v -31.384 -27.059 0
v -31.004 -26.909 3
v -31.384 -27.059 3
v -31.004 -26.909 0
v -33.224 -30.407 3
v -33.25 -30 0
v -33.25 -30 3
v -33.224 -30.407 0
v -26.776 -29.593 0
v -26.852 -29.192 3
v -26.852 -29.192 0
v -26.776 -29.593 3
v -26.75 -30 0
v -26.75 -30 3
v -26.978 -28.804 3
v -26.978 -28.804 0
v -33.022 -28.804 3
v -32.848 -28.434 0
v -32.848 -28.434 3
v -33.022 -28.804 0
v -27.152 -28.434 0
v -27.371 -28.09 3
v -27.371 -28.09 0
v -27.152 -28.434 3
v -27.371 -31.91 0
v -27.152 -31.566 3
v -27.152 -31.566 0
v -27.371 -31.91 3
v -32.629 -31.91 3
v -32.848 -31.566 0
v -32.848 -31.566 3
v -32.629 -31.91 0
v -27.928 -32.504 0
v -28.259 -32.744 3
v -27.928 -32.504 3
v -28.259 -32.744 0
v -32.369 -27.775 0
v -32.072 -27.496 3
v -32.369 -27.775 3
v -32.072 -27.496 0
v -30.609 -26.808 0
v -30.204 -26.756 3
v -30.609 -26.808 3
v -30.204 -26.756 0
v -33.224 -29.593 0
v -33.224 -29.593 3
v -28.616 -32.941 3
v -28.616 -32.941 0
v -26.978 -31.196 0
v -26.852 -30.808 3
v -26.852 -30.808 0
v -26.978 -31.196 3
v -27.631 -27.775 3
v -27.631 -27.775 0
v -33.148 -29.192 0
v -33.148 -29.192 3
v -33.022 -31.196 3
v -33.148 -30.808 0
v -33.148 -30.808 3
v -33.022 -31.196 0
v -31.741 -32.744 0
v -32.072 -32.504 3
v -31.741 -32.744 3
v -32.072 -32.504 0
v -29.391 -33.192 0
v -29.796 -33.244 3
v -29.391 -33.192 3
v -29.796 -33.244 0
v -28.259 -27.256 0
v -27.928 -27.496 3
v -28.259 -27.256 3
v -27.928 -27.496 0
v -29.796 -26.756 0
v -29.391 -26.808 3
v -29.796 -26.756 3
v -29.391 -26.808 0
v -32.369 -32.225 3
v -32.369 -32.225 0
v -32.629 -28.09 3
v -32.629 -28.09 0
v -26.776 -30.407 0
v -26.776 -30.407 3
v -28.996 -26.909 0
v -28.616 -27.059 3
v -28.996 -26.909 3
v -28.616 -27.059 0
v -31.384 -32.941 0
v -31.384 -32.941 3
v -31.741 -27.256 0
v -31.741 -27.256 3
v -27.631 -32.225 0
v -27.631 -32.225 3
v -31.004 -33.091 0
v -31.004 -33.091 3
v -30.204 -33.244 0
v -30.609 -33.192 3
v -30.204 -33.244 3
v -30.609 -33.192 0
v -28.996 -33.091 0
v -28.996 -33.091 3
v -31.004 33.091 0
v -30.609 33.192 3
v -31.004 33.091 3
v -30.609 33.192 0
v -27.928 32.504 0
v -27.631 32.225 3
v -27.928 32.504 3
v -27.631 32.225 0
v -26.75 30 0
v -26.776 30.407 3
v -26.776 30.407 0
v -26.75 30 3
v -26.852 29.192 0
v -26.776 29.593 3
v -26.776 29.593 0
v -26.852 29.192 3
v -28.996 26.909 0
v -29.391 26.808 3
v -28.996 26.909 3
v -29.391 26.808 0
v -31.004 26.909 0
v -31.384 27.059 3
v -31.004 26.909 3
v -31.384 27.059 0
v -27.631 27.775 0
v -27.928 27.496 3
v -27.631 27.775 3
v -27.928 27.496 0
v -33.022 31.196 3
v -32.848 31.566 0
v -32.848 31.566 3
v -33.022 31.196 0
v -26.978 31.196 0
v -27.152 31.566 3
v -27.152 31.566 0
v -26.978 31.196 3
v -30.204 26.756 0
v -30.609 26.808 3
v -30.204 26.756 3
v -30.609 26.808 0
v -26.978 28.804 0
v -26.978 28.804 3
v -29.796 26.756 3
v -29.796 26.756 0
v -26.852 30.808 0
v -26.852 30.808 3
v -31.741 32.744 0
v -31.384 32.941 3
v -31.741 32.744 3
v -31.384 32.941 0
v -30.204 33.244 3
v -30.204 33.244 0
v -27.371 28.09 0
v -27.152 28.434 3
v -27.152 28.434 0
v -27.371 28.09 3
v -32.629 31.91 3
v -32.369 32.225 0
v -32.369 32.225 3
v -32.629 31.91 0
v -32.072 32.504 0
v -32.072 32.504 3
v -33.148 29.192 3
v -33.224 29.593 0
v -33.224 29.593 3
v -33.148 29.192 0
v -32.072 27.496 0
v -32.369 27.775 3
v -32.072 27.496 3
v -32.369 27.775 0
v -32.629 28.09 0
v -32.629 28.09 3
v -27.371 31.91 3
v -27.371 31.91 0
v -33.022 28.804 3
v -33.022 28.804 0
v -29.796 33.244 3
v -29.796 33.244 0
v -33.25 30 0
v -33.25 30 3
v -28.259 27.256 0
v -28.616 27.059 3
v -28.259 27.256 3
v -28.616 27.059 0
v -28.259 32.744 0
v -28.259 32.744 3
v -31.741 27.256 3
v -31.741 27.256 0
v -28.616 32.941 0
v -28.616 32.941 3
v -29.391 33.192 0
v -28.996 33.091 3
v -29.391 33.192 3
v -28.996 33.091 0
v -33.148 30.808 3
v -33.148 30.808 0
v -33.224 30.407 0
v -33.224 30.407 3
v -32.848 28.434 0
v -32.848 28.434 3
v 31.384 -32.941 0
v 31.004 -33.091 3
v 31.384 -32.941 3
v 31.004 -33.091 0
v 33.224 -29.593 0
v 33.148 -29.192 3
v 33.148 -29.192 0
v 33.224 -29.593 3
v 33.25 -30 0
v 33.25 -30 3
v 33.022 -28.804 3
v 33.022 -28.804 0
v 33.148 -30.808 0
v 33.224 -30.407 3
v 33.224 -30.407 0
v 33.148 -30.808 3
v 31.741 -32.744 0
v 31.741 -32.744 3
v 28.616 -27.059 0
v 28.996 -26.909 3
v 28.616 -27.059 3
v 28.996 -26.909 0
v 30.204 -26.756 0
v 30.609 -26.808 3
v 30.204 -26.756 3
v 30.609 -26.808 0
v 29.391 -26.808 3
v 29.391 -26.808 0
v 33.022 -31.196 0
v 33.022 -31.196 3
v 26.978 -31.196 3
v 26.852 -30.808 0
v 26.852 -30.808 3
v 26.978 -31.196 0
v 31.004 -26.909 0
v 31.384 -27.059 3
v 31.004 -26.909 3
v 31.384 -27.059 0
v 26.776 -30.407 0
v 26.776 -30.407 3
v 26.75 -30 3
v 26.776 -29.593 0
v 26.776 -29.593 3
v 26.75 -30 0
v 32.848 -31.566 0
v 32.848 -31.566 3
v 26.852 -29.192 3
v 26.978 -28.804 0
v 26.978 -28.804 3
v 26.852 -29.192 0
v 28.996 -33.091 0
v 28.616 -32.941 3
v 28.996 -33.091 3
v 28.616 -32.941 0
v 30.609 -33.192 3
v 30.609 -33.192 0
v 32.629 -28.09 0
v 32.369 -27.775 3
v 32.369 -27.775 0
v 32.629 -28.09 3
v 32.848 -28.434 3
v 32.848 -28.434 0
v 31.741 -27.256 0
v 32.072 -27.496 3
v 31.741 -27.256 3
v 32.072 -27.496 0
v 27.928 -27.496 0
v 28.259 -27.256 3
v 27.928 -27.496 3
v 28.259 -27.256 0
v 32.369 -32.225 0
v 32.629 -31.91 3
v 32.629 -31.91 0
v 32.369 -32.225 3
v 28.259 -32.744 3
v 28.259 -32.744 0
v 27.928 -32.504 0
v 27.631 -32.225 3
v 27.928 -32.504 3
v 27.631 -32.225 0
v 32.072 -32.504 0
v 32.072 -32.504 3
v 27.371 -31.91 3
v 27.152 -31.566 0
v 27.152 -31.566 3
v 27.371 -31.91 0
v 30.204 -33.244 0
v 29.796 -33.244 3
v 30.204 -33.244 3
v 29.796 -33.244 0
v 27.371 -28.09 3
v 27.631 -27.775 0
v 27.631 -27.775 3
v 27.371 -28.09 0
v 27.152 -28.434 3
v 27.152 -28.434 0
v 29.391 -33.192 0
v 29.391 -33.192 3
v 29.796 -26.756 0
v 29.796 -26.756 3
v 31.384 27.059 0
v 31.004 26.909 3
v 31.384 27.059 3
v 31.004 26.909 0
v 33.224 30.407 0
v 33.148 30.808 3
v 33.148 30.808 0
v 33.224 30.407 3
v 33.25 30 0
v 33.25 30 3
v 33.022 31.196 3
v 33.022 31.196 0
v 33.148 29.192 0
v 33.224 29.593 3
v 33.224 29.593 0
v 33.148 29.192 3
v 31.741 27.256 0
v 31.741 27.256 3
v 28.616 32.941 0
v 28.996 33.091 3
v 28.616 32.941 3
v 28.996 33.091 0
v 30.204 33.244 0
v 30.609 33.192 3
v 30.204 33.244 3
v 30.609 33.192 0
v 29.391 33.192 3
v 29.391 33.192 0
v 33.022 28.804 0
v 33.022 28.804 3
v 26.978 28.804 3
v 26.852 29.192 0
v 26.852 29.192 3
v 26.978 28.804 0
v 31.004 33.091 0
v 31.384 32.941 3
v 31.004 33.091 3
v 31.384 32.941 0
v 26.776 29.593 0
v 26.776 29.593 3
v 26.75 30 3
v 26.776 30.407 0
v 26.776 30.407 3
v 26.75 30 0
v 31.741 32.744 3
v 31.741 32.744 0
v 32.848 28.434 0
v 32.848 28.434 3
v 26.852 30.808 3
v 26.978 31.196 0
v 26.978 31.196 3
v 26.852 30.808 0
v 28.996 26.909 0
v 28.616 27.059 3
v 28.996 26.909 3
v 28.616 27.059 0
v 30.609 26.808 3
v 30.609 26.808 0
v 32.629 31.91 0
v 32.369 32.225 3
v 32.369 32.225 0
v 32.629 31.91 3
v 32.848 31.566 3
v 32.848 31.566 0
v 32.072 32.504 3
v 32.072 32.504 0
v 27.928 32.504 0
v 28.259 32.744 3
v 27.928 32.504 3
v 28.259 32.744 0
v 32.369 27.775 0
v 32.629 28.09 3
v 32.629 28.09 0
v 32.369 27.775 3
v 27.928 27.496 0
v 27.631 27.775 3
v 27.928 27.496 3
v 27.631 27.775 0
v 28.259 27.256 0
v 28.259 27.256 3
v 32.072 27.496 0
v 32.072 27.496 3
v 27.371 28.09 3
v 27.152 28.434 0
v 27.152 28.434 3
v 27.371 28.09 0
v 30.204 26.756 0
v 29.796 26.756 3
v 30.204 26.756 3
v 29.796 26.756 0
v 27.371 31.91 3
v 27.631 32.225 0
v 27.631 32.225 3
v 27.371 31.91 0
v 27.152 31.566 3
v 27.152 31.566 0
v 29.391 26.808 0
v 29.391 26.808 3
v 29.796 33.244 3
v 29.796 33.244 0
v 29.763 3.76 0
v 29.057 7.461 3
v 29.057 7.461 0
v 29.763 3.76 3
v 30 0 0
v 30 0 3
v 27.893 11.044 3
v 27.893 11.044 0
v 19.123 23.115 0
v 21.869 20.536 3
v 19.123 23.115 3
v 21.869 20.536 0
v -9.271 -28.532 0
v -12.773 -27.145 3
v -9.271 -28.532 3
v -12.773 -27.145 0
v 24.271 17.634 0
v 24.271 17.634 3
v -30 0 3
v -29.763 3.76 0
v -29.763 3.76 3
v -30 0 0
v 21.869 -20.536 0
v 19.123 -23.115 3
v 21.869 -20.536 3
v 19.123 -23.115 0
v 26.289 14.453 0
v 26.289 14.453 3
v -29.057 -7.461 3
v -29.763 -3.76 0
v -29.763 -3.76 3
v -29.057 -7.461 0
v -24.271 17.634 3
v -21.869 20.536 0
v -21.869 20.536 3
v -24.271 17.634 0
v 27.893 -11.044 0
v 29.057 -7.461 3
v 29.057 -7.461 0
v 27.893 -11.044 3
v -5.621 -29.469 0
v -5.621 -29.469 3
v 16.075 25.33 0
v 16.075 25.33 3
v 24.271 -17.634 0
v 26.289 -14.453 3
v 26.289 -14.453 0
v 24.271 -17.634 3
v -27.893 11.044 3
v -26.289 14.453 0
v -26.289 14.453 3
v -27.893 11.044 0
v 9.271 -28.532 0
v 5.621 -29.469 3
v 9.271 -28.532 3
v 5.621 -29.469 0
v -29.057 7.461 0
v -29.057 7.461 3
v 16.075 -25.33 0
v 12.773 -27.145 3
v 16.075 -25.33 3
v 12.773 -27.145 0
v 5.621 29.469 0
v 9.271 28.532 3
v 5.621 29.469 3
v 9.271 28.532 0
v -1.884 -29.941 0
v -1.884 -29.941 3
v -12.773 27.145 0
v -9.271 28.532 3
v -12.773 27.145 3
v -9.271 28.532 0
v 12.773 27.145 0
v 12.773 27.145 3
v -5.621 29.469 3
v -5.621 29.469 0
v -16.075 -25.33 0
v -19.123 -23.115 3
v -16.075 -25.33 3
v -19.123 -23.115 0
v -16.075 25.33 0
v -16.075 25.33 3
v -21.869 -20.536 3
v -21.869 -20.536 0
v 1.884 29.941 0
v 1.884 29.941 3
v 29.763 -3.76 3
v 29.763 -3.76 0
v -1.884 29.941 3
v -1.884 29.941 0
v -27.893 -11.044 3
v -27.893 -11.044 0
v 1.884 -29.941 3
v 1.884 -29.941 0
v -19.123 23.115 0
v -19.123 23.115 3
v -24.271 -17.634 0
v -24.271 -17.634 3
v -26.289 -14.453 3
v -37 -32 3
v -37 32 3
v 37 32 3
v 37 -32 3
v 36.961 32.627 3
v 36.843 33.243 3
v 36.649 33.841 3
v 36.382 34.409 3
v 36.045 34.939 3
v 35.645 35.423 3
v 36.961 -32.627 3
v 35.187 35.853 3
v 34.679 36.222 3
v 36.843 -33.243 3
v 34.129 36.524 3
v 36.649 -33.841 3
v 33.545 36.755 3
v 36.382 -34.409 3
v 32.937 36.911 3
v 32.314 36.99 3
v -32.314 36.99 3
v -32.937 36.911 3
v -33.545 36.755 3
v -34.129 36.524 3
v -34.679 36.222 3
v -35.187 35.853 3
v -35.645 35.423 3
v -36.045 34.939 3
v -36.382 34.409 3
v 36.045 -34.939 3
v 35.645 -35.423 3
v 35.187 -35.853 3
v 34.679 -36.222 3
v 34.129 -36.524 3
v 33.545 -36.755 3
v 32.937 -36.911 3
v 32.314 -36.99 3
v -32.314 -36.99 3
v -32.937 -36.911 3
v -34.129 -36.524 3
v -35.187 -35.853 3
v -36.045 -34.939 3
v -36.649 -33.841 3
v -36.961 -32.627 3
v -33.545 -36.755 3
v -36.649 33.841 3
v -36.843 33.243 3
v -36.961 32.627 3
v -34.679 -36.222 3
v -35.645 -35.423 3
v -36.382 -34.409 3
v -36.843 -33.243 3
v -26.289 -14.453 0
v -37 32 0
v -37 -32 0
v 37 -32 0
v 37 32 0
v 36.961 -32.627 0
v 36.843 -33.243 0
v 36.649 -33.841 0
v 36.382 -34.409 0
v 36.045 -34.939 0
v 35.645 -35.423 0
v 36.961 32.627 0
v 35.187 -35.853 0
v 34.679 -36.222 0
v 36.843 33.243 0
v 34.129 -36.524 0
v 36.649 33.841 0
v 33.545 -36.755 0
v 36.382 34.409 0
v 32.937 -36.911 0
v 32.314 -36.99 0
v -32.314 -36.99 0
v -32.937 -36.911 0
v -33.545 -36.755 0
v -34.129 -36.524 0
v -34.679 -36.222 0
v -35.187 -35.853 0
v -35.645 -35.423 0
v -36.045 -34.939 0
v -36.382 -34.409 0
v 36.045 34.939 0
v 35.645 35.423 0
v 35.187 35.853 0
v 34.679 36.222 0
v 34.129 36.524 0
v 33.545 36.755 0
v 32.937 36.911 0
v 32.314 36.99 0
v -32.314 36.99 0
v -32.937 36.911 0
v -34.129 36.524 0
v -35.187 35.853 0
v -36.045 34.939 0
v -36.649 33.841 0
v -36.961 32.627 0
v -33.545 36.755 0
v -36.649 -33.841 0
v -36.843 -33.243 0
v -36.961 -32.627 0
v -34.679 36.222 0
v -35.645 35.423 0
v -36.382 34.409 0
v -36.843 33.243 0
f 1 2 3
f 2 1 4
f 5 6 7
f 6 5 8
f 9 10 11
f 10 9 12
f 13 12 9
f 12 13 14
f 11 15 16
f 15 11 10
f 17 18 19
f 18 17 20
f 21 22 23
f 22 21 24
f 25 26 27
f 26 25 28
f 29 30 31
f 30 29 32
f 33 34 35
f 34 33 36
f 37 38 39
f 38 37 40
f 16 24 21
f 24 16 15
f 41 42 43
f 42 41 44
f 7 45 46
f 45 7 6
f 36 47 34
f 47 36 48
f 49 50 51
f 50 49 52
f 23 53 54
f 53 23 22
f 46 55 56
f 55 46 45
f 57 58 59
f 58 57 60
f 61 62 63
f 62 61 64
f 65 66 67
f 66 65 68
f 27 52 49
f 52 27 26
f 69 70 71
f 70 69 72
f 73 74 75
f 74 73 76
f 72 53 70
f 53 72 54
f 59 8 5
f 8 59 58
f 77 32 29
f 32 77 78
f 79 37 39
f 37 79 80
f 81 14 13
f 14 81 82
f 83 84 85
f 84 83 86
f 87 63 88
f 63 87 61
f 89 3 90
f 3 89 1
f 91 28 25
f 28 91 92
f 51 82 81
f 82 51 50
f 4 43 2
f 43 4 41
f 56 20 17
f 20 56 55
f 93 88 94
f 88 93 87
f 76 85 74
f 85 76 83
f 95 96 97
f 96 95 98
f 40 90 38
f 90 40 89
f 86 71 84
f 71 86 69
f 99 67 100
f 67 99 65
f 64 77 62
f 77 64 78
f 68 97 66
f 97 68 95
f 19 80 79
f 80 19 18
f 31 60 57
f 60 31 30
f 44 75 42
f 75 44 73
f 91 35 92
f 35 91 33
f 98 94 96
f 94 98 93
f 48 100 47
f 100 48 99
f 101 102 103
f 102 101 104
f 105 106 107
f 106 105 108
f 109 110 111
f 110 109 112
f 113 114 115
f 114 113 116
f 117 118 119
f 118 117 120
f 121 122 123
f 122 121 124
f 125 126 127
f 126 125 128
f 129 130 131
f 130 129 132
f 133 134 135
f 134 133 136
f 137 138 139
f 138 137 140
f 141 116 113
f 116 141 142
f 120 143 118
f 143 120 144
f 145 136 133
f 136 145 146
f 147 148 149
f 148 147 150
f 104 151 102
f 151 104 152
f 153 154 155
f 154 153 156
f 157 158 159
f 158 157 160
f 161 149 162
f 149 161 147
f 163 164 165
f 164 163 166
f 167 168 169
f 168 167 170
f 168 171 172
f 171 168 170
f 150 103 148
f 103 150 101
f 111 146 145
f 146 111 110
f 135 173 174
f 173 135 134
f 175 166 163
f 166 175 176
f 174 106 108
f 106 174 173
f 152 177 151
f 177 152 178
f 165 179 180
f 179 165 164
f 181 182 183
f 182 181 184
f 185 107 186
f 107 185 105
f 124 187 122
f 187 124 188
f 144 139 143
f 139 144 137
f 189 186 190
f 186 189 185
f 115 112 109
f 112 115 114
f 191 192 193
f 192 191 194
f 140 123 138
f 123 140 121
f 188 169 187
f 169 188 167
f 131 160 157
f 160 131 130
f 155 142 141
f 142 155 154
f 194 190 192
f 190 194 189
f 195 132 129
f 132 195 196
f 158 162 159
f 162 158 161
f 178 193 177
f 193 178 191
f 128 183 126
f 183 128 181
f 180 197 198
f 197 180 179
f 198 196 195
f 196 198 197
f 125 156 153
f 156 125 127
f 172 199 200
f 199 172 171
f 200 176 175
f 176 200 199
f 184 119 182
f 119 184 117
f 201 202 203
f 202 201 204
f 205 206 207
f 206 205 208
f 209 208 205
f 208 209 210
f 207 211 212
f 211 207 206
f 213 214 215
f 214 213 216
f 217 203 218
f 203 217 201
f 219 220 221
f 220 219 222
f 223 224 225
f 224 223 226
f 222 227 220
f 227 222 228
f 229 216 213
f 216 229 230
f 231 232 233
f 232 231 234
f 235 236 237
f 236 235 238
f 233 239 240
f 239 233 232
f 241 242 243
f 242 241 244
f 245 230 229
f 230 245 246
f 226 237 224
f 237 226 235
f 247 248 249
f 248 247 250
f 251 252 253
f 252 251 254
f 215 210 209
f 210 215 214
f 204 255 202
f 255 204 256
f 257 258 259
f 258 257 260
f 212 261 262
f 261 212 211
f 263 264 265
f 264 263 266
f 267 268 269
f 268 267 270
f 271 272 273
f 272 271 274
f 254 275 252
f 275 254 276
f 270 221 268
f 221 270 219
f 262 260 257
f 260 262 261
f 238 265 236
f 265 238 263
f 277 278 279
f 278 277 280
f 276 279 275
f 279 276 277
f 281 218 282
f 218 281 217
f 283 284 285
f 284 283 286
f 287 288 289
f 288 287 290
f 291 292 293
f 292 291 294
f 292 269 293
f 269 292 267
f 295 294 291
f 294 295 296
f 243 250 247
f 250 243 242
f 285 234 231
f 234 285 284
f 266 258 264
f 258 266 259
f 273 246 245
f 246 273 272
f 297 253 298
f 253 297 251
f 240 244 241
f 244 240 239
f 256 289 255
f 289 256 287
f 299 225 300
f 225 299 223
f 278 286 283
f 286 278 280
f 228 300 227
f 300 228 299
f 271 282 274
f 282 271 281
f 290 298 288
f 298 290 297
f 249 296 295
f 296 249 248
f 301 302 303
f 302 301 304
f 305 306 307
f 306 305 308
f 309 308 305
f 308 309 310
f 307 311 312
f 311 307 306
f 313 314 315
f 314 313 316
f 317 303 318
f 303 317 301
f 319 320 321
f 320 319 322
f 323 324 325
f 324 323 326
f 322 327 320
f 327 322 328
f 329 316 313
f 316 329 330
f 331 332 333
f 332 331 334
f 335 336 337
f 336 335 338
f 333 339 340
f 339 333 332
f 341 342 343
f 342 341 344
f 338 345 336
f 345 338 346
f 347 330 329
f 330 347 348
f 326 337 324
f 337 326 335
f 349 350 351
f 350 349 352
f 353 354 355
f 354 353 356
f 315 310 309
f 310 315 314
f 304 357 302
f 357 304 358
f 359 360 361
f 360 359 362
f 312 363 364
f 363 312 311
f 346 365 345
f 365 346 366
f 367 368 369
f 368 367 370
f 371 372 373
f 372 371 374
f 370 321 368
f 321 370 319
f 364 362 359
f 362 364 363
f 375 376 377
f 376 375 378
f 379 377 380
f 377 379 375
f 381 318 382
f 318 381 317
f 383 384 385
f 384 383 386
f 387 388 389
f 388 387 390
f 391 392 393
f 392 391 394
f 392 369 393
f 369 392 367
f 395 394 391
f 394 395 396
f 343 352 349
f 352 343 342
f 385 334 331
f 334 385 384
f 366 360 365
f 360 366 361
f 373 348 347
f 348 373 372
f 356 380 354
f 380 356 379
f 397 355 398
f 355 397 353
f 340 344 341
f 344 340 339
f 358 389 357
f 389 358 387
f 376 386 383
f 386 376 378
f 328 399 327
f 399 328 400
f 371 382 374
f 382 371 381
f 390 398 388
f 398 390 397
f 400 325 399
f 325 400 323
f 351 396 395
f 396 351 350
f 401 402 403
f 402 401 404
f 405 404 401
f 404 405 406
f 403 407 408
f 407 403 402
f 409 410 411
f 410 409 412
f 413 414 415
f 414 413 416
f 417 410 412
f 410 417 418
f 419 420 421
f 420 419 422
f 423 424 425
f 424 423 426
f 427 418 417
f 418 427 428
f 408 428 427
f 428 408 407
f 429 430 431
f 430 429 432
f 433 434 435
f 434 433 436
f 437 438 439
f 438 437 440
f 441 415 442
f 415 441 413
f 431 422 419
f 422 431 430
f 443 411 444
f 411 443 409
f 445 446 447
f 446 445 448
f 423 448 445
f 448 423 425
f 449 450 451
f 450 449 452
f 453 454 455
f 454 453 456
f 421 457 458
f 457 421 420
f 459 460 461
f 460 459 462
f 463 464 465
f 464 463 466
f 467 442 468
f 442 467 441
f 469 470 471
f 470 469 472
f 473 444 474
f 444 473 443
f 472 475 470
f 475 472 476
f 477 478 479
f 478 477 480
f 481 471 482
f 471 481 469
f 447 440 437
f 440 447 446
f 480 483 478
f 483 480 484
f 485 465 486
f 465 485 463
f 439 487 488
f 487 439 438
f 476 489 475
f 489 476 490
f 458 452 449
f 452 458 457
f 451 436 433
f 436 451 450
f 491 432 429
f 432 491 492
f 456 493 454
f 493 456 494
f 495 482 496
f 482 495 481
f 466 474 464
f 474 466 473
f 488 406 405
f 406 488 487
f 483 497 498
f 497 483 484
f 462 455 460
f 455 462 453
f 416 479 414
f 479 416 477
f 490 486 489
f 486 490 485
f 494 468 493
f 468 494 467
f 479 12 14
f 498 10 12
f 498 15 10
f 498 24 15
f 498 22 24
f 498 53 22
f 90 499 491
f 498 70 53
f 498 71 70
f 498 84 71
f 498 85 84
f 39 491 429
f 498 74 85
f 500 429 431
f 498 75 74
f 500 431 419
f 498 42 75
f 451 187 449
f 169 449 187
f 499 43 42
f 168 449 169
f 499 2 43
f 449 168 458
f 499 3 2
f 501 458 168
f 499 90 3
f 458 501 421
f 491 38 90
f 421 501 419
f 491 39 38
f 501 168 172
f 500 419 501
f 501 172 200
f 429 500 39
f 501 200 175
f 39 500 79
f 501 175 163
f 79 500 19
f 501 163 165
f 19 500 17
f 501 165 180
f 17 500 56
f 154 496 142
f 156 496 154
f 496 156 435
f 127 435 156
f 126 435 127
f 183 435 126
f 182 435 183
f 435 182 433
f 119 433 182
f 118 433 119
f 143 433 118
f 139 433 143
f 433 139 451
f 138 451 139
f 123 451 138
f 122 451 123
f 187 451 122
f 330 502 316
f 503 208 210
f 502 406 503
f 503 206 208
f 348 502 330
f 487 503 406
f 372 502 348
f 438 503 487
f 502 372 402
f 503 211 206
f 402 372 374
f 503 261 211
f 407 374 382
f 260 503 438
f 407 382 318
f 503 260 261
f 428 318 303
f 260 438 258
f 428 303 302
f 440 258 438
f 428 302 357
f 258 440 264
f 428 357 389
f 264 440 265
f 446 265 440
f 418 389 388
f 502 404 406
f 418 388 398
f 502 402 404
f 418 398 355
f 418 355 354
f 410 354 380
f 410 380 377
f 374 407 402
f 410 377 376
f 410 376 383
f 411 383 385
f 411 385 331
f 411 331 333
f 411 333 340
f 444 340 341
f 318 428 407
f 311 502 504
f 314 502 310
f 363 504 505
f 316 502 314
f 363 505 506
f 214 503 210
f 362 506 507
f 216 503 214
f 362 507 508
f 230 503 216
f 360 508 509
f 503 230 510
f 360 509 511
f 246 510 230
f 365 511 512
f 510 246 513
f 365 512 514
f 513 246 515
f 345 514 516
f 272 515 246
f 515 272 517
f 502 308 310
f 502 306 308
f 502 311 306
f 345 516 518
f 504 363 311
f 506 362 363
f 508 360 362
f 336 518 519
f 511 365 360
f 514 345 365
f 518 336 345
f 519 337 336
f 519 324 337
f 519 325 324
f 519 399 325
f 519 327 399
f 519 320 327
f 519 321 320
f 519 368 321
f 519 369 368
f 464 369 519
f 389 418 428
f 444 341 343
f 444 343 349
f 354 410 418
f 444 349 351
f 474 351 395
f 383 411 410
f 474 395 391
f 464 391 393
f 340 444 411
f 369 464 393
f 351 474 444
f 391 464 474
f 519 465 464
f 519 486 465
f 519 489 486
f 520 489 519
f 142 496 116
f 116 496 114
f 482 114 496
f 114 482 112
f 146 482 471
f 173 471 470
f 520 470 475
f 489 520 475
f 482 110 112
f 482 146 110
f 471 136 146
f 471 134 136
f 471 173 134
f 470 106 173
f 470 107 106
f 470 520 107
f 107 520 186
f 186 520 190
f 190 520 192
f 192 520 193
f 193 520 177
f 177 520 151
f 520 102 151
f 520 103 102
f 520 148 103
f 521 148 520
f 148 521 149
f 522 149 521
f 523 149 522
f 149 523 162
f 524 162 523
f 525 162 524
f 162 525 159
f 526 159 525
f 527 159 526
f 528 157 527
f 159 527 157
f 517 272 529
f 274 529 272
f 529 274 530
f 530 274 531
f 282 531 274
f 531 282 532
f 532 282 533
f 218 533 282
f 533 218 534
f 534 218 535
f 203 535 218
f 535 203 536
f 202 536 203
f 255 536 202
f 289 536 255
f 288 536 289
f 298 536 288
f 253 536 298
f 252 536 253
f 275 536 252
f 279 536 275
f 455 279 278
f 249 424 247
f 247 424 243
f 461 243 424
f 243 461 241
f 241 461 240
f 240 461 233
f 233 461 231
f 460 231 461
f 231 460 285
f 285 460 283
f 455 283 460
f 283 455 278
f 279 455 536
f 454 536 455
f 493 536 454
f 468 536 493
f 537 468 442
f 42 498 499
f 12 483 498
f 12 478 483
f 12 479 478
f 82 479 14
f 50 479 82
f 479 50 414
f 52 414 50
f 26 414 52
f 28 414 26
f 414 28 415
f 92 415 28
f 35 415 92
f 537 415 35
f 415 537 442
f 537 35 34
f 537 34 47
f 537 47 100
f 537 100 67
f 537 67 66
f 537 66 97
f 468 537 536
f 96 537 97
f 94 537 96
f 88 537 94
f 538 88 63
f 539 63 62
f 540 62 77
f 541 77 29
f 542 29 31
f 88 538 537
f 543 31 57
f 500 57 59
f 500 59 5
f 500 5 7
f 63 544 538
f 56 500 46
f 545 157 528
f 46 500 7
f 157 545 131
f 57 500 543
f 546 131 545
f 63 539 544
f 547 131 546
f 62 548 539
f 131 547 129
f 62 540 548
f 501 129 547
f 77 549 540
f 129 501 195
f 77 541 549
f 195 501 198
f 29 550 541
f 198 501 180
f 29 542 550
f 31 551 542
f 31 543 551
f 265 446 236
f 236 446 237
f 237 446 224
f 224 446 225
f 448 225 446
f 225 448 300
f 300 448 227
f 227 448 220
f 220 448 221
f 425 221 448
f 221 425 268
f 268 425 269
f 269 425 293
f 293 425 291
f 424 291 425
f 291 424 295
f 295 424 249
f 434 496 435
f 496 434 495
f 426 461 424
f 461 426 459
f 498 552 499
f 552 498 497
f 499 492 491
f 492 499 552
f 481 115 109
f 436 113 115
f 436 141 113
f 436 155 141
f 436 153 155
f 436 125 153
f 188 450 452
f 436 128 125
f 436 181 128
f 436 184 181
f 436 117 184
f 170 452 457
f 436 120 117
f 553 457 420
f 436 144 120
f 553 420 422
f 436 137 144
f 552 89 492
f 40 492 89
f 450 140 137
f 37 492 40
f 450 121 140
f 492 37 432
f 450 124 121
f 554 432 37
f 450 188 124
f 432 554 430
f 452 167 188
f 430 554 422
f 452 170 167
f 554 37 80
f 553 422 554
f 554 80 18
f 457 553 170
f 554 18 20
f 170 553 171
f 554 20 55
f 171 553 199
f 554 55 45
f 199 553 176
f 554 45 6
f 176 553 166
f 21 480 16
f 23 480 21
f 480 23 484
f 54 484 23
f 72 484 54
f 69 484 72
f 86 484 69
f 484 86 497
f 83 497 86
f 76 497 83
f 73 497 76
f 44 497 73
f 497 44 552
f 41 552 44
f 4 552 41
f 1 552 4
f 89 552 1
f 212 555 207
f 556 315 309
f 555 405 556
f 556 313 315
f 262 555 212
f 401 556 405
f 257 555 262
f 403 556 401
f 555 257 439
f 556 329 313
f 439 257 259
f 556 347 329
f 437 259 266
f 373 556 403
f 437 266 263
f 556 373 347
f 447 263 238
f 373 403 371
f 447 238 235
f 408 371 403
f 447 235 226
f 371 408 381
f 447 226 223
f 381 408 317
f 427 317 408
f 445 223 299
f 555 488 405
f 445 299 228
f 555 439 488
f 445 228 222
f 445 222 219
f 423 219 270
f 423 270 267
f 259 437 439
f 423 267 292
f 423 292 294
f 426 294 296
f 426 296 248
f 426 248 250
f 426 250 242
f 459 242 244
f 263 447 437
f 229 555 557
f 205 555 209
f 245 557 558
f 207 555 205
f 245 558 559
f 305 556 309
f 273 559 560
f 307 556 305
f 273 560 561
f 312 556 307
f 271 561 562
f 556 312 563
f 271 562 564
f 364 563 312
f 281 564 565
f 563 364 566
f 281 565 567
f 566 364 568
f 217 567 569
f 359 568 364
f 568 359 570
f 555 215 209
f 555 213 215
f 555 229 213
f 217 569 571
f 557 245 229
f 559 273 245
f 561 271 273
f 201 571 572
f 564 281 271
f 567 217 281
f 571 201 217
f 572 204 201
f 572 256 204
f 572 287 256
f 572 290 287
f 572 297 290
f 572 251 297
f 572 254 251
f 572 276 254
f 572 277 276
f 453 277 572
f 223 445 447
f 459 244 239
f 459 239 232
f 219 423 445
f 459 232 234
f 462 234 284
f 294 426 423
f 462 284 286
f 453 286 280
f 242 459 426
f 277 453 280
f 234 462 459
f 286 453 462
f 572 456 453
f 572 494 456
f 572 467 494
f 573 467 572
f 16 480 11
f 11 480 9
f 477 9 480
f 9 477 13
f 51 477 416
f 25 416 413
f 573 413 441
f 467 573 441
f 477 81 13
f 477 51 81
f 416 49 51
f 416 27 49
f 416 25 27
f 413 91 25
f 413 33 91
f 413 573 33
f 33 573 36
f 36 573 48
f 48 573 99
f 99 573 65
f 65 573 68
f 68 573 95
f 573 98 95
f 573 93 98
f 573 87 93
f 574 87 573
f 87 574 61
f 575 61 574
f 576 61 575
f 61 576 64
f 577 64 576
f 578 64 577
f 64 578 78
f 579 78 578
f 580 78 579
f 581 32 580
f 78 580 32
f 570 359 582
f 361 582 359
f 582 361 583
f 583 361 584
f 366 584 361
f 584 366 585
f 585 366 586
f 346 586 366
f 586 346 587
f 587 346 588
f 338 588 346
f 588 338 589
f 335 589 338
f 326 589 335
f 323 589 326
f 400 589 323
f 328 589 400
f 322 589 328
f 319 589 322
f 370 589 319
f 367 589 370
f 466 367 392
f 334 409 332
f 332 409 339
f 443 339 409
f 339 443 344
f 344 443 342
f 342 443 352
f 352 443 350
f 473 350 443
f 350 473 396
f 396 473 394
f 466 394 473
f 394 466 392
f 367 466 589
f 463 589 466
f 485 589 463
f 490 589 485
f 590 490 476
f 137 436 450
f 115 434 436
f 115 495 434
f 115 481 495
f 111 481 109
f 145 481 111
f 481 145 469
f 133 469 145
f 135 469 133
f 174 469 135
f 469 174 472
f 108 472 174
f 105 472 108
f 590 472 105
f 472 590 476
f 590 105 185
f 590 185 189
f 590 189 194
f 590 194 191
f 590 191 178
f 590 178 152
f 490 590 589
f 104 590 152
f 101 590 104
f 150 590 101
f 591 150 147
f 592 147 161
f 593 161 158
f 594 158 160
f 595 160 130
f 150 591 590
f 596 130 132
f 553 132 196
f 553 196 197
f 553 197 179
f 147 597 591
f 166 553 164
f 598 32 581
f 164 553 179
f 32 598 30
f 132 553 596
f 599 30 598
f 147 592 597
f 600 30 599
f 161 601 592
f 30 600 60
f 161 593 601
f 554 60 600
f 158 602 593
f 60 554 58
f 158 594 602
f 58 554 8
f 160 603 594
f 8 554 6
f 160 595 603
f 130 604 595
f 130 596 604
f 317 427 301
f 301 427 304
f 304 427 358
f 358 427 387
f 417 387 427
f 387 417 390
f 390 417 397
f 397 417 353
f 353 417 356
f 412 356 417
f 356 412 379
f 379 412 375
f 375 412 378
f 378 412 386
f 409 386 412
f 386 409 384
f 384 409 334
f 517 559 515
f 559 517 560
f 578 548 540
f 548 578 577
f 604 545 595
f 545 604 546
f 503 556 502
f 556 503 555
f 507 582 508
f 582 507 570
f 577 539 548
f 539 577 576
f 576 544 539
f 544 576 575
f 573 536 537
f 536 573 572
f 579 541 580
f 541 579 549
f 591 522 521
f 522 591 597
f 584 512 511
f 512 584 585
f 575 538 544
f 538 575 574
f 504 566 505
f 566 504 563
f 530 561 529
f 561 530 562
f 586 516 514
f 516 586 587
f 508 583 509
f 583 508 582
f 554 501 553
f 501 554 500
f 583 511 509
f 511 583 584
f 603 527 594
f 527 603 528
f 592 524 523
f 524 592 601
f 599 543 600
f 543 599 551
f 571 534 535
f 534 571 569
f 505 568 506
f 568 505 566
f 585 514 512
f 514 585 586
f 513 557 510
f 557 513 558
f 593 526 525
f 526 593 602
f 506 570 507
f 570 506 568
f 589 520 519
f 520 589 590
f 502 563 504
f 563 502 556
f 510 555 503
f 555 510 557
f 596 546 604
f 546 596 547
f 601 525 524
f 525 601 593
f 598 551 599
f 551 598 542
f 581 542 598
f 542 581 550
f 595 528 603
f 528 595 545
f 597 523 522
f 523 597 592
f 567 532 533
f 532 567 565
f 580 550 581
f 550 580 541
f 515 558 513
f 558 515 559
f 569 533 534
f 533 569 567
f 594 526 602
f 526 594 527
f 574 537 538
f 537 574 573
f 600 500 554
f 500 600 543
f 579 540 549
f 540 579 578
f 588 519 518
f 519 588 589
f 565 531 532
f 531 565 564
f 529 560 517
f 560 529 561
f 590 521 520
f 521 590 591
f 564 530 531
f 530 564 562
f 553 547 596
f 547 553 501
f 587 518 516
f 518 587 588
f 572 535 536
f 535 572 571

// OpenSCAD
$fn = 50;


difference() {
	union() {
		hull() {
			translate(v = [-32.0000000000, 32.0000000000, 0]) {
				cylinder(h = 3, r = 5);
			}
			translate(v = [32.0000000000, 32.0000000000, 0]) {
				cylinder(h = 3, r = 5);
			}
			translate(v = [-32.0000000000, -32.0000000000, 0]) {
				cylinder(h = 3, r = 5);
			}
			translate(v = [32.0000000000, -32.0000000000, 0]) {
				cylinder(h = 3, r = 5);
			}
		}
	}
	union() {
		#translate(v = [-30.0000000000, -30.0000000000, -100.0000000000]) {
			cylinder(h = 200, r = 3.2500000000);
		}
		#translate(v = [-30.0000000000, 30.0000000000, -100.0000000000]) {
			cylinder(h = 200, r = 3.2500000000);
		}
		#translate(v = [30.0000000000, -30.0000000000, -100.0000000000]) {
			cylinder(h = 200, r = 3.2500000000);
		}
		#translate(v = [30.0000000000, 30.0000000000, -100.0000000000]) {
			cylinder(h = 200, r = 3.2500000000);
		}
		#cylinder(h = 3, r = 30.0000000000);
	}
}
